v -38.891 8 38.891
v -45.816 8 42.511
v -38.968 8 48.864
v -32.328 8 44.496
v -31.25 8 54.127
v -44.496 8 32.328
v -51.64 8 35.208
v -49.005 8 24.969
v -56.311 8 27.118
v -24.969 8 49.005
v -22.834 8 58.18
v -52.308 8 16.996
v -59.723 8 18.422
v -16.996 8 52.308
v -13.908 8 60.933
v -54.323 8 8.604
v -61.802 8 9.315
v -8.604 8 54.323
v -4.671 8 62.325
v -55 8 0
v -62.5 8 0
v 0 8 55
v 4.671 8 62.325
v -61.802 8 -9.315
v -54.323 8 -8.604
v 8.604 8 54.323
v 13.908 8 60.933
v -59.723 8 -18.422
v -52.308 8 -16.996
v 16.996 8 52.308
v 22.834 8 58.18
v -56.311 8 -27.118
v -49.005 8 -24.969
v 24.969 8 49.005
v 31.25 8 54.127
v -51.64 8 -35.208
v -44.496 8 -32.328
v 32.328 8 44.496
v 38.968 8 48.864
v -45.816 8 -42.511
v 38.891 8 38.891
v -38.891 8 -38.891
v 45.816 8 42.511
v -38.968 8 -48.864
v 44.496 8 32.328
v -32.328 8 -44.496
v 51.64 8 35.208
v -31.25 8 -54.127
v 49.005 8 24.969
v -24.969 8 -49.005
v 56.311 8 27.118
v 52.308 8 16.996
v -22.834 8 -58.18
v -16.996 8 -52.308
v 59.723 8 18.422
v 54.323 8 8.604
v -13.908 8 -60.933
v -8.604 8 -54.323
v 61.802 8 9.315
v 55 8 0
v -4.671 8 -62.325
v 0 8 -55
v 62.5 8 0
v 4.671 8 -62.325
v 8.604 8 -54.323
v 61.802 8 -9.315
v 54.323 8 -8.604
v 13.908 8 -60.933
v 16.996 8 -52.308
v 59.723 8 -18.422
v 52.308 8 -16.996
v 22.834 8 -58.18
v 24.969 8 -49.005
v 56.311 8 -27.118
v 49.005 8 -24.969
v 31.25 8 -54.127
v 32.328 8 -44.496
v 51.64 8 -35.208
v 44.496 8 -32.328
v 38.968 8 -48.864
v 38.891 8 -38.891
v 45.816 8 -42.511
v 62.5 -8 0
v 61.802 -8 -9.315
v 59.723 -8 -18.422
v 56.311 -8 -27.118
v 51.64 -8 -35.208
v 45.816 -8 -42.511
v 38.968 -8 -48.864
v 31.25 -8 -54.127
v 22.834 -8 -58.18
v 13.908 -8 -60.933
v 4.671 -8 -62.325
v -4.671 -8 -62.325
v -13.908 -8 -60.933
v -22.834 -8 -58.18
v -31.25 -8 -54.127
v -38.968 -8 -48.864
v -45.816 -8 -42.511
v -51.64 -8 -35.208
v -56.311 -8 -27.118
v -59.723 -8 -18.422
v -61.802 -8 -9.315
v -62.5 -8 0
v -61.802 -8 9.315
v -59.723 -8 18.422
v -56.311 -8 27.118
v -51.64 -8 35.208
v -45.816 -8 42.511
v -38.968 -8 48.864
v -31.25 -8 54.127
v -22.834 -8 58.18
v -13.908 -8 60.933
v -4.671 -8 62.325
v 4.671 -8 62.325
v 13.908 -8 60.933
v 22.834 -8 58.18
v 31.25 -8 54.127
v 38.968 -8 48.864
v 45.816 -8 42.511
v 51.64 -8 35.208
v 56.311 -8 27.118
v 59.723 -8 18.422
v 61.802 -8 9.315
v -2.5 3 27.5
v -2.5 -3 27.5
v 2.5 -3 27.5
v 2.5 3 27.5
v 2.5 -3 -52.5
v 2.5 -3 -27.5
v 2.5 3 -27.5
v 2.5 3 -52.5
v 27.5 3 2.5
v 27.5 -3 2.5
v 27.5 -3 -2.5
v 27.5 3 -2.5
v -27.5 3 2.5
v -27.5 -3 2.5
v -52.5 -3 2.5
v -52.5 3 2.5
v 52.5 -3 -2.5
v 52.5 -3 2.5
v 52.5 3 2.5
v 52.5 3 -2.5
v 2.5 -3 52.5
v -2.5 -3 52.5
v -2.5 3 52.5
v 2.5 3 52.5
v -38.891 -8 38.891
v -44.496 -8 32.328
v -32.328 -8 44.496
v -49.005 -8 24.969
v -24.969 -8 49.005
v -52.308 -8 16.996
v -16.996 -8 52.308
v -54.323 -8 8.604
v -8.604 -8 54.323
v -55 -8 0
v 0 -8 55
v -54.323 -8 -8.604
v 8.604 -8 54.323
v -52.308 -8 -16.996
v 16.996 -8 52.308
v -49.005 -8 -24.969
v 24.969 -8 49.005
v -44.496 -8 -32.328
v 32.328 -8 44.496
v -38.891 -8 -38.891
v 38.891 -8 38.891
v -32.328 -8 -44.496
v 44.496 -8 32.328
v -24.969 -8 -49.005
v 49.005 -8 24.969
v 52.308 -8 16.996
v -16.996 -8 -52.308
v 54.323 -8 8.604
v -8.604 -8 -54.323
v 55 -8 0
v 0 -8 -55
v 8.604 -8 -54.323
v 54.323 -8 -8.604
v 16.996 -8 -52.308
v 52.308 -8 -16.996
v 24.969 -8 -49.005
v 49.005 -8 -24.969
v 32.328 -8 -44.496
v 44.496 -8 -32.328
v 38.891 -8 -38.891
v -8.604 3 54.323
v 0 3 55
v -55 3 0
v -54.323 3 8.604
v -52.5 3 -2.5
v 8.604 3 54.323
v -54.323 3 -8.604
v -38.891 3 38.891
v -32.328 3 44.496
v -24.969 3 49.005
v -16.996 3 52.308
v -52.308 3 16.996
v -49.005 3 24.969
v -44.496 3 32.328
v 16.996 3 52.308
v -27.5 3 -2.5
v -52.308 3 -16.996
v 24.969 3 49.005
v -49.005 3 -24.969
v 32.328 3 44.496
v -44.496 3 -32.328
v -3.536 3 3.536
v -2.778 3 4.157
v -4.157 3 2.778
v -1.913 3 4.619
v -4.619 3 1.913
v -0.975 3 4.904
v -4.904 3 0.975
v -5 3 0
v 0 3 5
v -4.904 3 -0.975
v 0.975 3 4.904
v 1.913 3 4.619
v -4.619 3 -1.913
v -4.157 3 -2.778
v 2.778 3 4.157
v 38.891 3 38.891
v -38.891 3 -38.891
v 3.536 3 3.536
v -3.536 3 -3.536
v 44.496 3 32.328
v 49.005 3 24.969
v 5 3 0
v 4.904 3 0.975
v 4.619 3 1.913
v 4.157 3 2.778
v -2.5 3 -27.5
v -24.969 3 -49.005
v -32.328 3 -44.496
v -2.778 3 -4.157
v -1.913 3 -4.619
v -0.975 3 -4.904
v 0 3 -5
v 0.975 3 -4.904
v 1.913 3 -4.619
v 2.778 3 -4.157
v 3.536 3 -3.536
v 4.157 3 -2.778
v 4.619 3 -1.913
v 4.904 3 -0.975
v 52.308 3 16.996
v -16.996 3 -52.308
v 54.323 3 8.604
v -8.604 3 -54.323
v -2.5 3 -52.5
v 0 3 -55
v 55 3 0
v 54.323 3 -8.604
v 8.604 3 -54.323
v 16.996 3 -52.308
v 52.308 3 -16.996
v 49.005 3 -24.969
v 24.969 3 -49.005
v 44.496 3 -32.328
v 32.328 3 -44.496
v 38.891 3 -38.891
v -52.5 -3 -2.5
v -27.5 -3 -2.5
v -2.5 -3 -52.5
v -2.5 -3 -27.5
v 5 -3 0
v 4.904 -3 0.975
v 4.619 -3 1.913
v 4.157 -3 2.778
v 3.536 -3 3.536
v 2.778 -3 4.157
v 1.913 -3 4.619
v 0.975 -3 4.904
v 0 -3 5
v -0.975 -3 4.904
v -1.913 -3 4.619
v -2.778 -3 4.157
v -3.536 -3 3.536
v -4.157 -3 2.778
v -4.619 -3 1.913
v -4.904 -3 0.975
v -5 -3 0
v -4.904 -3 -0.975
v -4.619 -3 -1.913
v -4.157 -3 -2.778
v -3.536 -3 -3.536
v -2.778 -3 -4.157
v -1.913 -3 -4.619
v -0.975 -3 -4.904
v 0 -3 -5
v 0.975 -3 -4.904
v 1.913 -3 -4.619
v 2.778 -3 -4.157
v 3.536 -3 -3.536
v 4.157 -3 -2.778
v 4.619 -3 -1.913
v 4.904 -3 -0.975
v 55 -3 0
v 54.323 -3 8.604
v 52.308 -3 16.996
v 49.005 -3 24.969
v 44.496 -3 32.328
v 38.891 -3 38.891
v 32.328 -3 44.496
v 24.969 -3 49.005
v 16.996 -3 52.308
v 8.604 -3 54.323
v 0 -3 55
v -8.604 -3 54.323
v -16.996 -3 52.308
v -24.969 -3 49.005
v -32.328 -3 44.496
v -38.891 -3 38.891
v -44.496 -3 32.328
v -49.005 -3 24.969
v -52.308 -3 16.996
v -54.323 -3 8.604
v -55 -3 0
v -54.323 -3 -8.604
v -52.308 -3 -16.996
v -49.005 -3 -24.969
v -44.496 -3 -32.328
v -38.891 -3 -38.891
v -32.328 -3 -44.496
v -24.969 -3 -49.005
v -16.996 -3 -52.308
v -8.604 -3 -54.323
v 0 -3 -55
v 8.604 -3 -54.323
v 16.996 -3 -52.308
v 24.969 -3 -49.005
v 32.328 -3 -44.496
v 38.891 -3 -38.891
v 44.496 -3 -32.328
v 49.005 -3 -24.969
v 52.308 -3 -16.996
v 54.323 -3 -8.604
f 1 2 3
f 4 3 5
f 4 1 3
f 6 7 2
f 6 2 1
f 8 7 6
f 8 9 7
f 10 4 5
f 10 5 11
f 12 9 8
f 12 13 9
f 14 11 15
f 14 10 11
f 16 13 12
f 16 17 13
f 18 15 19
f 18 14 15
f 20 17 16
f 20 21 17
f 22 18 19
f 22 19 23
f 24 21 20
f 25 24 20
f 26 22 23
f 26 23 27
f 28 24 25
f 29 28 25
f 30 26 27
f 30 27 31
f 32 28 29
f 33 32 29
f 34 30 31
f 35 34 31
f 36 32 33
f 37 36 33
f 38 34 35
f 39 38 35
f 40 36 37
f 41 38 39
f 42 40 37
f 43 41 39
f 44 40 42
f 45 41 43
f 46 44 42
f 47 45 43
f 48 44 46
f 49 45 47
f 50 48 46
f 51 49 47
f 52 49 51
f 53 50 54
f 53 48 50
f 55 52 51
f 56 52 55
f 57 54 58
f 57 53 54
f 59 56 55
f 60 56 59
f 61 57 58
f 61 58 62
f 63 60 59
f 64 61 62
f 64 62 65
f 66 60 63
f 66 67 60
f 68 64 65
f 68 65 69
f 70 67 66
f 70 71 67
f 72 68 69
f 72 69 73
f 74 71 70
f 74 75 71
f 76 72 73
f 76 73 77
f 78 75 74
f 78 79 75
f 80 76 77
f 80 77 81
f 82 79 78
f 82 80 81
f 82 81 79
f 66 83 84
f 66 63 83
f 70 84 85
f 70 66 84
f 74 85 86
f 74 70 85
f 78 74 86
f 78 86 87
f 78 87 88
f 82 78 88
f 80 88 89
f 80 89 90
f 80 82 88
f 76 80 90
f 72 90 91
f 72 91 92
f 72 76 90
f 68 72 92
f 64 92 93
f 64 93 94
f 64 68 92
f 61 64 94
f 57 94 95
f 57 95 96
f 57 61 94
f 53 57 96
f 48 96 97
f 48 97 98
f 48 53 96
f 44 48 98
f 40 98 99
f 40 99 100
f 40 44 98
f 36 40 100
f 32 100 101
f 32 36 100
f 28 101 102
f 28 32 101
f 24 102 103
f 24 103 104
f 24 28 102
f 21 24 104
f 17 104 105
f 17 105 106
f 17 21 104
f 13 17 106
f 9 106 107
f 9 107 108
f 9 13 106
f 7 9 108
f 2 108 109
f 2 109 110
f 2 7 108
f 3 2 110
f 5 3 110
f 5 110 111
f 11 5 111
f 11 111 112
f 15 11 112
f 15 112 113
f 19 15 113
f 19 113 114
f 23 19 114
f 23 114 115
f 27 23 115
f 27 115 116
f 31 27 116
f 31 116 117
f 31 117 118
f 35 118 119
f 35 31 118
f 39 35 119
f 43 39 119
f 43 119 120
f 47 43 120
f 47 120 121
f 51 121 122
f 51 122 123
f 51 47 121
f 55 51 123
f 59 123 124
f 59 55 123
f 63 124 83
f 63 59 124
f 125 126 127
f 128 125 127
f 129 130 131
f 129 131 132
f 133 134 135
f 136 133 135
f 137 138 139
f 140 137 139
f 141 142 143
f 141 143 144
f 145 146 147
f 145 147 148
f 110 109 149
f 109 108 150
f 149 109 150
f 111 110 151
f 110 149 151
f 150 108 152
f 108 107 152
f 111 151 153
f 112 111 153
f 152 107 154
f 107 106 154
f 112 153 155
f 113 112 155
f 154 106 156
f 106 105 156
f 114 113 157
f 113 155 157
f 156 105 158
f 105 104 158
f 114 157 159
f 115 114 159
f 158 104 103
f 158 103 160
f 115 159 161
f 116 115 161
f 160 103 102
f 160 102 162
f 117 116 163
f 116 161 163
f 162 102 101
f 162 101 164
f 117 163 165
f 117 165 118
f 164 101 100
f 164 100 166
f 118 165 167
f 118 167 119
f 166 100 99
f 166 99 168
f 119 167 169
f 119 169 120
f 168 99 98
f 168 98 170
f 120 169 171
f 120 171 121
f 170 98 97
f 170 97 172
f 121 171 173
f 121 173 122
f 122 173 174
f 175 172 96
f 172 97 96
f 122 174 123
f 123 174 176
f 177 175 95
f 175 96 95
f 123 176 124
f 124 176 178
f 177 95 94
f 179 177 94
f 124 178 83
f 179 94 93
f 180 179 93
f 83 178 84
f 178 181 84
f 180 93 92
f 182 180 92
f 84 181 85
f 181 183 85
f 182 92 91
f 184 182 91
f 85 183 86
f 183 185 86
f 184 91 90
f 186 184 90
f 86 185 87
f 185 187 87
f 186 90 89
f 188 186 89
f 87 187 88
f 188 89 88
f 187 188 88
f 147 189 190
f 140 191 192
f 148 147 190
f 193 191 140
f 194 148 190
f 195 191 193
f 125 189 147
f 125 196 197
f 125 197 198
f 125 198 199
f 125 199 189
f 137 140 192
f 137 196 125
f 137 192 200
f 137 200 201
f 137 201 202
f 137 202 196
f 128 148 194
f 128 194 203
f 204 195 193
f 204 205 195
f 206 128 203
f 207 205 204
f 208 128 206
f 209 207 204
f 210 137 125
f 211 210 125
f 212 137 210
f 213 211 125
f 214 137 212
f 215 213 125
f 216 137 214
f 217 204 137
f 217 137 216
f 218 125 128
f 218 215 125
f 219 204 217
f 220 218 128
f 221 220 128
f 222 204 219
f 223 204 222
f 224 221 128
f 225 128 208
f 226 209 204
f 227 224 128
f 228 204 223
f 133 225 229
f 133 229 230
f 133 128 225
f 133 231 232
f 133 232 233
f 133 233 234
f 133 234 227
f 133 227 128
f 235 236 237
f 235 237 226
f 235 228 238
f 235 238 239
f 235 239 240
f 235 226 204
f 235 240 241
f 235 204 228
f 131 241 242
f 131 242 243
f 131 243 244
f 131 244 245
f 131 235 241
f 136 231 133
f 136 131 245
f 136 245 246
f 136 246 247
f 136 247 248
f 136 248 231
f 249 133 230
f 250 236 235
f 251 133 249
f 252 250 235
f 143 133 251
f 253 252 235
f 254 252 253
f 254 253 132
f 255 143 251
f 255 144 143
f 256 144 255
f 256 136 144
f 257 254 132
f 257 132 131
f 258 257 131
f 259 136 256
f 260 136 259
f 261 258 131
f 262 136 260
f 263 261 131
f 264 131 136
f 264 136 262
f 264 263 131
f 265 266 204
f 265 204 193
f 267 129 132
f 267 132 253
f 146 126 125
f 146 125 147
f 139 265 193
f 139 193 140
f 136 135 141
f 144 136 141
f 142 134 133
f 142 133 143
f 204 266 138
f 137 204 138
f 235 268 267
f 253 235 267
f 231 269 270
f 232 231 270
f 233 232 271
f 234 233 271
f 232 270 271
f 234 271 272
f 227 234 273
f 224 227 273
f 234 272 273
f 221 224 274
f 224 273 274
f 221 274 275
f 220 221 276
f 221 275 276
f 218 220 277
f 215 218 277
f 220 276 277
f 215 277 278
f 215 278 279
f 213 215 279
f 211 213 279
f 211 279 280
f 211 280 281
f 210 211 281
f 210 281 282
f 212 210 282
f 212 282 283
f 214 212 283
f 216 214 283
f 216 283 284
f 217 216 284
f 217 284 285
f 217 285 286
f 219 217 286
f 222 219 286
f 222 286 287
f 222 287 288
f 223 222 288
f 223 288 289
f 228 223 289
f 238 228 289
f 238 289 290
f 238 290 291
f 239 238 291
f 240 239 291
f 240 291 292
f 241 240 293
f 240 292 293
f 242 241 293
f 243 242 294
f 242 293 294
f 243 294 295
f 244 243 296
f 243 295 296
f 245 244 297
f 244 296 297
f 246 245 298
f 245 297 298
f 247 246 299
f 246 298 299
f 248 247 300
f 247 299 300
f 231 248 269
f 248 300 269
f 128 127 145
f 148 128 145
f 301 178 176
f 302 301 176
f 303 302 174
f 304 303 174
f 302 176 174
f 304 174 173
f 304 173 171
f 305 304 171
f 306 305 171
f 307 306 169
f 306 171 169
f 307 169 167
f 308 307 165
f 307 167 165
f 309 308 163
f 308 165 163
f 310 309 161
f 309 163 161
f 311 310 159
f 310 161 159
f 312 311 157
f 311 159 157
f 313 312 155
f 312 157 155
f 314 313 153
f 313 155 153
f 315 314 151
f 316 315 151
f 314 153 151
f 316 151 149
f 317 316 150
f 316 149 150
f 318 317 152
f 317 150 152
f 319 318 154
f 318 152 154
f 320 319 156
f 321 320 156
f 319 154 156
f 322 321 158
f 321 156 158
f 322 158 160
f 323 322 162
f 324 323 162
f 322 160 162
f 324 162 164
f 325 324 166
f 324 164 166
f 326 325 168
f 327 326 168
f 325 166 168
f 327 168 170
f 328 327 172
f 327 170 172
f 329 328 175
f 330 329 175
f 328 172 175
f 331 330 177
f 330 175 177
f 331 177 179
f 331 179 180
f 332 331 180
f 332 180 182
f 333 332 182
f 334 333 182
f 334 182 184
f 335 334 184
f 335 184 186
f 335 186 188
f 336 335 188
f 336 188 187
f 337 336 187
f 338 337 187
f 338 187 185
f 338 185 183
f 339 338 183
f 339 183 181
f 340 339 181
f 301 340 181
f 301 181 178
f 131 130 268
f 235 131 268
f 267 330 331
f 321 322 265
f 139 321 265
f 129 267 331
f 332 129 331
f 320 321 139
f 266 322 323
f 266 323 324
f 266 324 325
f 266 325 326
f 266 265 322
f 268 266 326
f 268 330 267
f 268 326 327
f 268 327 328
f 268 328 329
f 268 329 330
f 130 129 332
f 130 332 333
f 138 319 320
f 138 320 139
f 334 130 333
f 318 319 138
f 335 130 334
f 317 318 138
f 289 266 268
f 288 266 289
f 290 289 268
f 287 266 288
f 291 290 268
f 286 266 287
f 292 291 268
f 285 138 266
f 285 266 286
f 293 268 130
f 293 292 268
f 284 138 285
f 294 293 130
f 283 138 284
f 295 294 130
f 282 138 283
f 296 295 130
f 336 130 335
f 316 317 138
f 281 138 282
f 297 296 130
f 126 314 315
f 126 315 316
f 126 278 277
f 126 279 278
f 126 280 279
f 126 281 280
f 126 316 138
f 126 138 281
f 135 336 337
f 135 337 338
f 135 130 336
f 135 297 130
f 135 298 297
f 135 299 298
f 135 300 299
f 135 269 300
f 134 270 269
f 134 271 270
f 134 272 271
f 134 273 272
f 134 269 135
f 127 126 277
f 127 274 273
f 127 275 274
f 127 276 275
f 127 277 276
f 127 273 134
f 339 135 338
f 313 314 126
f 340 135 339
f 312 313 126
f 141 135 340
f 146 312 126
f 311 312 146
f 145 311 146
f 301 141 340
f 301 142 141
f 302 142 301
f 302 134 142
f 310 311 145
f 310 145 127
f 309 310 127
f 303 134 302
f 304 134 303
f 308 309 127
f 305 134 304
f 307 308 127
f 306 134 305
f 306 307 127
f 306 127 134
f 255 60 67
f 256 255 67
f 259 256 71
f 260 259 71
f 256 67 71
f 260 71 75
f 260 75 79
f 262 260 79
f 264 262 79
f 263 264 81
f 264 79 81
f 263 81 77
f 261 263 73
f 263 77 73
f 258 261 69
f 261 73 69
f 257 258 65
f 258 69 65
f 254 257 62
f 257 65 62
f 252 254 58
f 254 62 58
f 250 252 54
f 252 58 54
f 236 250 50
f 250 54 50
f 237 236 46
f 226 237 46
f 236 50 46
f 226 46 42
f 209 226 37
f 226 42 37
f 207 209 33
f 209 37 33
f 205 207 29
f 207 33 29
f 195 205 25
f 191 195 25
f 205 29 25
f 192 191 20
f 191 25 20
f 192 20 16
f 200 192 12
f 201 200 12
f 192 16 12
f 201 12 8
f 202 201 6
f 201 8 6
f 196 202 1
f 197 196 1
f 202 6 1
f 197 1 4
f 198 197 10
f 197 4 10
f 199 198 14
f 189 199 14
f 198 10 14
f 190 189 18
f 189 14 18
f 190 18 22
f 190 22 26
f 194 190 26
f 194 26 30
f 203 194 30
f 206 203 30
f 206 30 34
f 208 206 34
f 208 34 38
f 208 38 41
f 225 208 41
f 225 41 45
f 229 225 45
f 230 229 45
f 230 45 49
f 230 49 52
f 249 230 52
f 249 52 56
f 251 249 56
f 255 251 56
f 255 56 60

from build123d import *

# Parameters (mm, degrees)
BOSS_EXTRUDE1_DEPTH      = 8
BOSS_EXTRUDE1_DEPTH_BACK = 8
SKETCH1_R                = 62.5
SKETCH2_R                = 55
CUT_EXTRUDE1_DEPTH       = 5
CUT_EXTRUDE2_START       = -5
SKETCH3_R                = 55
CUT_EXTRUDE2_DEPTH       = 5
SKETCH4_R                = 5
CUT_EXTRUDE3_DEPTH       = 90.070197036
SKETCH5_W                = 5
SKETCH5_H                = 25
CUT_EXTRUDE4_DEPTH       = 90.070197036
CIRPATTERN1_COUNT        = 4


with BuildPart() as part:
    # Sketch1 → Boss-Extrude1 (new, two sides: drawn at the far end of the back side and taken through both)
    with BuildSketch(Plane(origin=(0, 0, 0), x_dir=(1, 0, 0), z_dir=(0, 1, 0)).offset(-BOSS_EXTRUDE1_DEPTH_BACK)):
        Circle(SKETCH1_R)
    extrude(amount=BOSS_EXTRUDE1_DEPTH + BOSS_EXTRUDE1_DEPTH_BACK)

    # Sketch2 → Cut-Extrude1 (cut)
    with BuildSketch(Plane(origin=(0, 8, 0), x_dir=(1, 0, 0), z_dir=(0, 1, 0))):
        Circle(SKETCH2_R)
    extrude(amount=-CUT_EXTRUDE1_DEPTH, mode=Mode.SUBTRACT)

    # Sketch3 → Cut-Extrude2 (cut)
    with BuildSketch(Plane.XZ.offset(8).offset(CUT_EXTRUDE2_START)):
        Circle(SKETCH3_R)
    extrude(amount=CUT_EXTRUDE2_DEPTH, mode=Mode.SUBTRACT)

    # Sketch4 → Cut-Extrude3 (cut, through all)
    with BuildSketch(Plane.XZ.offset(3)):
        Circle(SKETCH4_R)
    extrude(amount=-CUT_EXTRUDE3_DEPTH, mode=Mode.SUBTRACT)

    # Sketch5 → Cut-Extrude4 (cut, through all)
    with BuildSketch(Plane.XZ.offset(3)):
        with Locations((0, 40)):
            Rectangle(SKETCH5_W, SKETCH5_H)
    cut_extrude4 = extrude(amount=-CUT_EXTRUDE4_DEPTH, mode=Mode.SUBTRACT)

    # CirPattern1: Cut-Extrude4 ×4 about axis
    cirpattern1_axis = Axis((0, -8, 0), (0, 1, 0))
    for i in range(1, CIRPATTERN1_COUNT):
        add(cut_extrude4.rotate(cirpattern1_axis, i * 360 / CIRPATTERN1_COUNT), mode=Mode.SUBTRACT)


solid = part.part
